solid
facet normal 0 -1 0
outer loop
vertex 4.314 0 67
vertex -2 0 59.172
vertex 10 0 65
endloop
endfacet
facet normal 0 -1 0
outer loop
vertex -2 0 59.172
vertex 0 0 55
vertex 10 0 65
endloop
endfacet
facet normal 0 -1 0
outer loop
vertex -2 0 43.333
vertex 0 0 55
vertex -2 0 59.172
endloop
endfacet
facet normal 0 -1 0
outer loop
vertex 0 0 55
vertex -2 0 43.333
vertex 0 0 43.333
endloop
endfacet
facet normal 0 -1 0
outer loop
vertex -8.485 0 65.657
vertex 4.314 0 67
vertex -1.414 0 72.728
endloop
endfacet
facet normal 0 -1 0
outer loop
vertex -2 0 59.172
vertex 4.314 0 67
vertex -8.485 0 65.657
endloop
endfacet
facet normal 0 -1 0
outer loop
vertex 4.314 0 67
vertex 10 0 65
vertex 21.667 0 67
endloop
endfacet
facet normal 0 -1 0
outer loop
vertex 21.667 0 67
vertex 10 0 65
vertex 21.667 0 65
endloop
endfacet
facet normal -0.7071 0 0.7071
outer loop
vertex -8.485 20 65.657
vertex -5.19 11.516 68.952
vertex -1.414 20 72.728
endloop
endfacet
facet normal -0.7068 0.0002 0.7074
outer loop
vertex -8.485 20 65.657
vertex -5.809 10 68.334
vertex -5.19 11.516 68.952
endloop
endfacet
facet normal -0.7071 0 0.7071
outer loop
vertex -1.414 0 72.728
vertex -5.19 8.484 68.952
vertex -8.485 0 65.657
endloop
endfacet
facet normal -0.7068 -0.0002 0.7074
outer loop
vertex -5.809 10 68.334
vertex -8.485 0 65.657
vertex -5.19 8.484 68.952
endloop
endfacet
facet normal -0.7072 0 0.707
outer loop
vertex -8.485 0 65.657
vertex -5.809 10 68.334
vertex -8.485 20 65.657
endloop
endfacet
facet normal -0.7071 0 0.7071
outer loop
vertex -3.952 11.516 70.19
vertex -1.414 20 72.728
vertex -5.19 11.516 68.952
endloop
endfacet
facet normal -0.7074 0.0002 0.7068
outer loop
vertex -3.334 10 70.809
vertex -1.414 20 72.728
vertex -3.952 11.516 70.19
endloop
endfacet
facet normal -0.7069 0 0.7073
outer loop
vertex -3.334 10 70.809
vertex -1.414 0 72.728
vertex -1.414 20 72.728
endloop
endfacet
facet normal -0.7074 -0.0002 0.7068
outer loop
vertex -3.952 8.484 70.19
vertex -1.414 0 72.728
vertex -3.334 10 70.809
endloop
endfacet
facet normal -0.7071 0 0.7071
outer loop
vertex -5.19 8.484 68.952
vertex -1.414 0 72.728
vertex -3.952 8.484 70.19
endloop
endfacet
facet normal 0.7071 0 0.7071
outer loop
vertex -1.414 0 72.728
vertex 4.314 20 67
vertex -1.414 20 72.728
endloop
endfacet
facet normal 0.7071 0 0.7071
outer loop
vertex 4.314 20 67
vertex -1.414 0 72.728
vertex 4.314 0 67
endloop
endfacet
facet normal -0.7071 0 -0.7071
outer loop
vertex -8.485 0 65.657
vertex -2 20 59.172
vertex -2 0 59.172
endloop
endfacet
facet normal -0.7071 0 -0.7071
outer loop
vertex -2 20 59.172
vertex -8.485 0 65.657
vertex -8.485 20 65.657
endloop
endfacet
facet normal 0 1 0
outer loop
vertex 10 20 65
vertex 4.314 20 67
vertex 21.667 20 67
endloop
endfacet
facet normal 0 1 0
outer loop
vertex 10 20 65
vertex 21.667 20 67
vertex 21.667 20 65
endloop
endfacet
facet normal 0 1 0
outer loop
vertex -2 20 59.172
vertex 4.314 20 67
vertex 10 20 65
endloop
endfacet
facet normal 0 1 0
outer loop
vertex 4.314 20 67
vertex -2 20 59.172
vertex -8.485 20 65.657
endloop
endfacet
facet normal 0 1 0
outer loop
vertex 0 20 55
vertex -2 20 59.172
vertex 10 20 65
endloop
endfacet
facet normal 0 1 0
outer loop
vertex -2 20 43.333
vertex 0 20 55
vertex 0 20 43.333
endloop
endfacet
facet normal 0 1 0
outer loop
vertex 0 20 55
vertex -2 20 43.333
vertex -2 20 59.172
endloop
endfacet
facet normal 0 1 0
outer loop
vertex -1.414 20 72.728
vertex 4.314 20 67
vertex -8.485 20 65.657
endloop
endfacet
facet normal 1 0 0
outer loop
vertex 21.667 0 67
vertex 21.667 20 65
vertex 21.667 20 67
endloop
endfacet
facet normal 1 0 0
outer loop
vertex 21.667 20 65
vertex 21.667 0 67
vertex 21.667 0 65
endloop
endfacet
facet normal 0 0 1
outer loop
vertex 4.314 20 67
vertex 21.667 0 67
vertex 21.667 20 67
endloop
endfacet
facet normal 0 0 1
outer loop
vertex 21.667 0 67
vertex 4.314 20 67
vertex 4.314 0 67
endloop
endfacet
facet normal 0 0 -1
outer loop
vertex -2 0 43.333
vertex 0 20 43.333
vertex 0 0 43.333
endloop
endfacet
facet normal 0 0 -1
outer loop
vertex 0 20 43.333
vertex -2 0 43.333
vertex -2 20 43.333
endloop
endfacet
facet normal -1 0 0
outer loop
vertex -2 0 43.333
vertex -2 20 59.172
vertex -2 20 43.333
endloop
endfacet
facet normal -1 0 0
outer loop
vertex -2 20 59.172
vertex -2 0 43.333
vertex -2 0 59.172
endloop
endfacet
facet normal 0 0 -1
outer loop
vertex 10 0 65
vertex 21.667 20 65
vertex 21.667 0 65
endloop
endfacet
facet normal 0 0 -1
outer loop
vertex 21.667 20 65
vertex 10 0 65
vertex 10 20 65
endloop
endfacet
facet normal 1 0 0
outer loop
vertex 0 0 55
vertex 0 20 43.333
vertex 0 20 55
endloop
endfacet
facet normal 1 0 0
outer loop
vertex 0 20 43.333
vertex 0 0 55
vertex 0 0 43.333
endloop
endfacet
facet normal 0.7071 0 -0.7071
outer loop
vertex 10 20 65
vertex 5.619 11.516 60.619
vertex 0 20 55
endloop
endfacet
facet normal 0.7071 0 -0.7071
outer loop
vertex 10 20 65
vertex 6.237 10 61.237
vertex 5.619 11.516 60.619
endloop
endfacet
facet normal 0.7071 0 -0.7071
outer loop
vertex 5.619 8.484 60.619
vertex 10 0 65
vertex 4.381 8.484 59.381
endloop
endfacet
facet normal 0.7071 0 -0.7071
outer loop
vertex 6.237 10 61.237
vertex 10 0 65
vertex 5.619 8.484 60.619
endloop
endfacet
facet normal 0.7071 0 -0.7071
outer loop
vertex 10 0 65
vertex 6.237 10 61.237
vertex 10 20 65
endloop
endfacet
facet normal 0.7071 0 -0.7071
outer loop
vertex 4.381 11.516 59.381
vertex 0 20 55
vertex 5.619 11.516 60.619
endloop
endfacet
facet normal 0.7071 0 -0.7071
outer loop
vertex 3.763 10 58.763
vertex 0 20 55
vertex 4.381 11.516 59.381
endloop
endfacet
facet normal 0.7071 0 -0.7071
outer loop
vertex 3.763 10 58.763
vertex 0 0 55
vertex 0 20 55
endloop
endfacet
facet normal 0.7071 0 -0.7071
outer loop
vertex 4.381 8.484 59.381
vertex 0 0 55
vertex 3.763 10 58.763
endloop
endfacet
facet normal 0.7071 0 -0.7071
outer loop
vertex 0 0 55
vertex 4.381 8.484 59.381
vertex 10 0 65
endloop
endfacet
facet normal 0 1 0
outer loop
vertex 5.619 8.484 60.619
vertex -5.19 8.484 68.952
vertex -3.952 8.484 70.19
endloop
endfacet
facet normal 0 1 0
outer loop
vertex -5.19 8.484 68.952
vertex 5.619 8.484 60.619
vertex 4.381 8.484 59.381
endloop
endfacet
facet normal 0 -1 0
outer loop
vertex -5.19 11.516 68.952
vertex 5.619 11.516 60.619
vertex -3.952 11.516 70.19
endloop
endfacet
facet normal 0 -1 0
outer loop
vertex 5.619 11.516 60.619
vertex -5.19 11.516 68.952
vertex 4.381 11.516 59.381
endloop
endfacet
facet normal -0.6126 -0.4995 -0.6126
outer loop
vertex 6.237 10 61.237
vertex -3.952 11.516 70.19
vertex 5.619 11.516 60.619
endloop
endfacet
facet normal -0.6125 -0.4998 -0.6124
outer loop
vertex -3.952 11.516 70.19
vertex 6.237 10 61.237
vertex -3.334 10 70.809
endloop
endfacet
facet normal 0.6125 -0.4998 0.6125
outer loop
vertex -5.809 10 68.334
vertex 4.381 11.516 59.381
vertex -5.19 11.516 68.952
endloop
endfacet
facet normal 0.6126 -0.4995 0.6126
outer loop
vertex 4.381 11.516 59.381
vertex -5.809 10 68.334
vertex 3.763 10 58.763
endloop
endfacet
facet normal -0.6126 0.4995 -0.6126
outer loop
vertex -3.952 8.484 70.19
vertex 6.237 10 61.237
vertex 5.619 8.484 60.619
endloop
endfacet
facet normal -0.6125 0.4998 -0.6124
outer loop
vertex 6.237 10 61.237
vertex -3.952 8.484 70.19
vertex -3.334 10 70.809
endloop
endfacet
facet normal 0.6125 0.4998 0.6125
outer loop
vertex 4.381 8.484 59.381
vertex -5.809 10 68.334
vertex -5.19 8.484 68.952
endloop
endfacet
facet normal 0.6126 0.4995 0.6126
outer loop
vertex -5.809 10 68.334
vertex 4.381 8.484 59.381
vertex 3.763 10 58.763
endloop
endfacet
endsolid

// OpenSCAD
slopeA      = 45;
chassisH    = 65;
chassisL    = 206;
chassisW    = 200;

legsTh      = 2;
legsW       = 20;

riserH      = 10;

m3d = 3.5;



difference(){
    union(){
        riser ();  
        bracket();
    }
    translate ([0,legsW/2,chassisH])
        rotate ([0,-45,0])
            translate ([0,0,-20])
                #cylinder(r=m3d/2, h = 40);     
    
    translate([0,-0.1,0])
    chassis();

}

module riser(){
    translate([0,0,60])
        rotate([0,-slopeA,0])
            translate([-2,0,0])
                cube ([10,legsW,riserH]);
    }
module bracket(){
    translate([-legsTh,0,(chassisH / 3)*2]){
        rotate([0,0,0])
            cube ([chassisH/3 + legsTh, legsW, chassisH/3 + legsTh]);
    }
}

module chassis(){
    difference(){
        cube ([chassisL, chassisW + 0.2, chassisH]);
        translate ([0,0,55])
                rotate([0,-slopeA,0])
                    cube([chassisL,200,chassisH]);
        translate ([0,0,10])
                rotate([0,slopeA,0])
                        translate([0,0,-chassisH])
                    cube([chassisL,200,chassisH]);
    }
}
